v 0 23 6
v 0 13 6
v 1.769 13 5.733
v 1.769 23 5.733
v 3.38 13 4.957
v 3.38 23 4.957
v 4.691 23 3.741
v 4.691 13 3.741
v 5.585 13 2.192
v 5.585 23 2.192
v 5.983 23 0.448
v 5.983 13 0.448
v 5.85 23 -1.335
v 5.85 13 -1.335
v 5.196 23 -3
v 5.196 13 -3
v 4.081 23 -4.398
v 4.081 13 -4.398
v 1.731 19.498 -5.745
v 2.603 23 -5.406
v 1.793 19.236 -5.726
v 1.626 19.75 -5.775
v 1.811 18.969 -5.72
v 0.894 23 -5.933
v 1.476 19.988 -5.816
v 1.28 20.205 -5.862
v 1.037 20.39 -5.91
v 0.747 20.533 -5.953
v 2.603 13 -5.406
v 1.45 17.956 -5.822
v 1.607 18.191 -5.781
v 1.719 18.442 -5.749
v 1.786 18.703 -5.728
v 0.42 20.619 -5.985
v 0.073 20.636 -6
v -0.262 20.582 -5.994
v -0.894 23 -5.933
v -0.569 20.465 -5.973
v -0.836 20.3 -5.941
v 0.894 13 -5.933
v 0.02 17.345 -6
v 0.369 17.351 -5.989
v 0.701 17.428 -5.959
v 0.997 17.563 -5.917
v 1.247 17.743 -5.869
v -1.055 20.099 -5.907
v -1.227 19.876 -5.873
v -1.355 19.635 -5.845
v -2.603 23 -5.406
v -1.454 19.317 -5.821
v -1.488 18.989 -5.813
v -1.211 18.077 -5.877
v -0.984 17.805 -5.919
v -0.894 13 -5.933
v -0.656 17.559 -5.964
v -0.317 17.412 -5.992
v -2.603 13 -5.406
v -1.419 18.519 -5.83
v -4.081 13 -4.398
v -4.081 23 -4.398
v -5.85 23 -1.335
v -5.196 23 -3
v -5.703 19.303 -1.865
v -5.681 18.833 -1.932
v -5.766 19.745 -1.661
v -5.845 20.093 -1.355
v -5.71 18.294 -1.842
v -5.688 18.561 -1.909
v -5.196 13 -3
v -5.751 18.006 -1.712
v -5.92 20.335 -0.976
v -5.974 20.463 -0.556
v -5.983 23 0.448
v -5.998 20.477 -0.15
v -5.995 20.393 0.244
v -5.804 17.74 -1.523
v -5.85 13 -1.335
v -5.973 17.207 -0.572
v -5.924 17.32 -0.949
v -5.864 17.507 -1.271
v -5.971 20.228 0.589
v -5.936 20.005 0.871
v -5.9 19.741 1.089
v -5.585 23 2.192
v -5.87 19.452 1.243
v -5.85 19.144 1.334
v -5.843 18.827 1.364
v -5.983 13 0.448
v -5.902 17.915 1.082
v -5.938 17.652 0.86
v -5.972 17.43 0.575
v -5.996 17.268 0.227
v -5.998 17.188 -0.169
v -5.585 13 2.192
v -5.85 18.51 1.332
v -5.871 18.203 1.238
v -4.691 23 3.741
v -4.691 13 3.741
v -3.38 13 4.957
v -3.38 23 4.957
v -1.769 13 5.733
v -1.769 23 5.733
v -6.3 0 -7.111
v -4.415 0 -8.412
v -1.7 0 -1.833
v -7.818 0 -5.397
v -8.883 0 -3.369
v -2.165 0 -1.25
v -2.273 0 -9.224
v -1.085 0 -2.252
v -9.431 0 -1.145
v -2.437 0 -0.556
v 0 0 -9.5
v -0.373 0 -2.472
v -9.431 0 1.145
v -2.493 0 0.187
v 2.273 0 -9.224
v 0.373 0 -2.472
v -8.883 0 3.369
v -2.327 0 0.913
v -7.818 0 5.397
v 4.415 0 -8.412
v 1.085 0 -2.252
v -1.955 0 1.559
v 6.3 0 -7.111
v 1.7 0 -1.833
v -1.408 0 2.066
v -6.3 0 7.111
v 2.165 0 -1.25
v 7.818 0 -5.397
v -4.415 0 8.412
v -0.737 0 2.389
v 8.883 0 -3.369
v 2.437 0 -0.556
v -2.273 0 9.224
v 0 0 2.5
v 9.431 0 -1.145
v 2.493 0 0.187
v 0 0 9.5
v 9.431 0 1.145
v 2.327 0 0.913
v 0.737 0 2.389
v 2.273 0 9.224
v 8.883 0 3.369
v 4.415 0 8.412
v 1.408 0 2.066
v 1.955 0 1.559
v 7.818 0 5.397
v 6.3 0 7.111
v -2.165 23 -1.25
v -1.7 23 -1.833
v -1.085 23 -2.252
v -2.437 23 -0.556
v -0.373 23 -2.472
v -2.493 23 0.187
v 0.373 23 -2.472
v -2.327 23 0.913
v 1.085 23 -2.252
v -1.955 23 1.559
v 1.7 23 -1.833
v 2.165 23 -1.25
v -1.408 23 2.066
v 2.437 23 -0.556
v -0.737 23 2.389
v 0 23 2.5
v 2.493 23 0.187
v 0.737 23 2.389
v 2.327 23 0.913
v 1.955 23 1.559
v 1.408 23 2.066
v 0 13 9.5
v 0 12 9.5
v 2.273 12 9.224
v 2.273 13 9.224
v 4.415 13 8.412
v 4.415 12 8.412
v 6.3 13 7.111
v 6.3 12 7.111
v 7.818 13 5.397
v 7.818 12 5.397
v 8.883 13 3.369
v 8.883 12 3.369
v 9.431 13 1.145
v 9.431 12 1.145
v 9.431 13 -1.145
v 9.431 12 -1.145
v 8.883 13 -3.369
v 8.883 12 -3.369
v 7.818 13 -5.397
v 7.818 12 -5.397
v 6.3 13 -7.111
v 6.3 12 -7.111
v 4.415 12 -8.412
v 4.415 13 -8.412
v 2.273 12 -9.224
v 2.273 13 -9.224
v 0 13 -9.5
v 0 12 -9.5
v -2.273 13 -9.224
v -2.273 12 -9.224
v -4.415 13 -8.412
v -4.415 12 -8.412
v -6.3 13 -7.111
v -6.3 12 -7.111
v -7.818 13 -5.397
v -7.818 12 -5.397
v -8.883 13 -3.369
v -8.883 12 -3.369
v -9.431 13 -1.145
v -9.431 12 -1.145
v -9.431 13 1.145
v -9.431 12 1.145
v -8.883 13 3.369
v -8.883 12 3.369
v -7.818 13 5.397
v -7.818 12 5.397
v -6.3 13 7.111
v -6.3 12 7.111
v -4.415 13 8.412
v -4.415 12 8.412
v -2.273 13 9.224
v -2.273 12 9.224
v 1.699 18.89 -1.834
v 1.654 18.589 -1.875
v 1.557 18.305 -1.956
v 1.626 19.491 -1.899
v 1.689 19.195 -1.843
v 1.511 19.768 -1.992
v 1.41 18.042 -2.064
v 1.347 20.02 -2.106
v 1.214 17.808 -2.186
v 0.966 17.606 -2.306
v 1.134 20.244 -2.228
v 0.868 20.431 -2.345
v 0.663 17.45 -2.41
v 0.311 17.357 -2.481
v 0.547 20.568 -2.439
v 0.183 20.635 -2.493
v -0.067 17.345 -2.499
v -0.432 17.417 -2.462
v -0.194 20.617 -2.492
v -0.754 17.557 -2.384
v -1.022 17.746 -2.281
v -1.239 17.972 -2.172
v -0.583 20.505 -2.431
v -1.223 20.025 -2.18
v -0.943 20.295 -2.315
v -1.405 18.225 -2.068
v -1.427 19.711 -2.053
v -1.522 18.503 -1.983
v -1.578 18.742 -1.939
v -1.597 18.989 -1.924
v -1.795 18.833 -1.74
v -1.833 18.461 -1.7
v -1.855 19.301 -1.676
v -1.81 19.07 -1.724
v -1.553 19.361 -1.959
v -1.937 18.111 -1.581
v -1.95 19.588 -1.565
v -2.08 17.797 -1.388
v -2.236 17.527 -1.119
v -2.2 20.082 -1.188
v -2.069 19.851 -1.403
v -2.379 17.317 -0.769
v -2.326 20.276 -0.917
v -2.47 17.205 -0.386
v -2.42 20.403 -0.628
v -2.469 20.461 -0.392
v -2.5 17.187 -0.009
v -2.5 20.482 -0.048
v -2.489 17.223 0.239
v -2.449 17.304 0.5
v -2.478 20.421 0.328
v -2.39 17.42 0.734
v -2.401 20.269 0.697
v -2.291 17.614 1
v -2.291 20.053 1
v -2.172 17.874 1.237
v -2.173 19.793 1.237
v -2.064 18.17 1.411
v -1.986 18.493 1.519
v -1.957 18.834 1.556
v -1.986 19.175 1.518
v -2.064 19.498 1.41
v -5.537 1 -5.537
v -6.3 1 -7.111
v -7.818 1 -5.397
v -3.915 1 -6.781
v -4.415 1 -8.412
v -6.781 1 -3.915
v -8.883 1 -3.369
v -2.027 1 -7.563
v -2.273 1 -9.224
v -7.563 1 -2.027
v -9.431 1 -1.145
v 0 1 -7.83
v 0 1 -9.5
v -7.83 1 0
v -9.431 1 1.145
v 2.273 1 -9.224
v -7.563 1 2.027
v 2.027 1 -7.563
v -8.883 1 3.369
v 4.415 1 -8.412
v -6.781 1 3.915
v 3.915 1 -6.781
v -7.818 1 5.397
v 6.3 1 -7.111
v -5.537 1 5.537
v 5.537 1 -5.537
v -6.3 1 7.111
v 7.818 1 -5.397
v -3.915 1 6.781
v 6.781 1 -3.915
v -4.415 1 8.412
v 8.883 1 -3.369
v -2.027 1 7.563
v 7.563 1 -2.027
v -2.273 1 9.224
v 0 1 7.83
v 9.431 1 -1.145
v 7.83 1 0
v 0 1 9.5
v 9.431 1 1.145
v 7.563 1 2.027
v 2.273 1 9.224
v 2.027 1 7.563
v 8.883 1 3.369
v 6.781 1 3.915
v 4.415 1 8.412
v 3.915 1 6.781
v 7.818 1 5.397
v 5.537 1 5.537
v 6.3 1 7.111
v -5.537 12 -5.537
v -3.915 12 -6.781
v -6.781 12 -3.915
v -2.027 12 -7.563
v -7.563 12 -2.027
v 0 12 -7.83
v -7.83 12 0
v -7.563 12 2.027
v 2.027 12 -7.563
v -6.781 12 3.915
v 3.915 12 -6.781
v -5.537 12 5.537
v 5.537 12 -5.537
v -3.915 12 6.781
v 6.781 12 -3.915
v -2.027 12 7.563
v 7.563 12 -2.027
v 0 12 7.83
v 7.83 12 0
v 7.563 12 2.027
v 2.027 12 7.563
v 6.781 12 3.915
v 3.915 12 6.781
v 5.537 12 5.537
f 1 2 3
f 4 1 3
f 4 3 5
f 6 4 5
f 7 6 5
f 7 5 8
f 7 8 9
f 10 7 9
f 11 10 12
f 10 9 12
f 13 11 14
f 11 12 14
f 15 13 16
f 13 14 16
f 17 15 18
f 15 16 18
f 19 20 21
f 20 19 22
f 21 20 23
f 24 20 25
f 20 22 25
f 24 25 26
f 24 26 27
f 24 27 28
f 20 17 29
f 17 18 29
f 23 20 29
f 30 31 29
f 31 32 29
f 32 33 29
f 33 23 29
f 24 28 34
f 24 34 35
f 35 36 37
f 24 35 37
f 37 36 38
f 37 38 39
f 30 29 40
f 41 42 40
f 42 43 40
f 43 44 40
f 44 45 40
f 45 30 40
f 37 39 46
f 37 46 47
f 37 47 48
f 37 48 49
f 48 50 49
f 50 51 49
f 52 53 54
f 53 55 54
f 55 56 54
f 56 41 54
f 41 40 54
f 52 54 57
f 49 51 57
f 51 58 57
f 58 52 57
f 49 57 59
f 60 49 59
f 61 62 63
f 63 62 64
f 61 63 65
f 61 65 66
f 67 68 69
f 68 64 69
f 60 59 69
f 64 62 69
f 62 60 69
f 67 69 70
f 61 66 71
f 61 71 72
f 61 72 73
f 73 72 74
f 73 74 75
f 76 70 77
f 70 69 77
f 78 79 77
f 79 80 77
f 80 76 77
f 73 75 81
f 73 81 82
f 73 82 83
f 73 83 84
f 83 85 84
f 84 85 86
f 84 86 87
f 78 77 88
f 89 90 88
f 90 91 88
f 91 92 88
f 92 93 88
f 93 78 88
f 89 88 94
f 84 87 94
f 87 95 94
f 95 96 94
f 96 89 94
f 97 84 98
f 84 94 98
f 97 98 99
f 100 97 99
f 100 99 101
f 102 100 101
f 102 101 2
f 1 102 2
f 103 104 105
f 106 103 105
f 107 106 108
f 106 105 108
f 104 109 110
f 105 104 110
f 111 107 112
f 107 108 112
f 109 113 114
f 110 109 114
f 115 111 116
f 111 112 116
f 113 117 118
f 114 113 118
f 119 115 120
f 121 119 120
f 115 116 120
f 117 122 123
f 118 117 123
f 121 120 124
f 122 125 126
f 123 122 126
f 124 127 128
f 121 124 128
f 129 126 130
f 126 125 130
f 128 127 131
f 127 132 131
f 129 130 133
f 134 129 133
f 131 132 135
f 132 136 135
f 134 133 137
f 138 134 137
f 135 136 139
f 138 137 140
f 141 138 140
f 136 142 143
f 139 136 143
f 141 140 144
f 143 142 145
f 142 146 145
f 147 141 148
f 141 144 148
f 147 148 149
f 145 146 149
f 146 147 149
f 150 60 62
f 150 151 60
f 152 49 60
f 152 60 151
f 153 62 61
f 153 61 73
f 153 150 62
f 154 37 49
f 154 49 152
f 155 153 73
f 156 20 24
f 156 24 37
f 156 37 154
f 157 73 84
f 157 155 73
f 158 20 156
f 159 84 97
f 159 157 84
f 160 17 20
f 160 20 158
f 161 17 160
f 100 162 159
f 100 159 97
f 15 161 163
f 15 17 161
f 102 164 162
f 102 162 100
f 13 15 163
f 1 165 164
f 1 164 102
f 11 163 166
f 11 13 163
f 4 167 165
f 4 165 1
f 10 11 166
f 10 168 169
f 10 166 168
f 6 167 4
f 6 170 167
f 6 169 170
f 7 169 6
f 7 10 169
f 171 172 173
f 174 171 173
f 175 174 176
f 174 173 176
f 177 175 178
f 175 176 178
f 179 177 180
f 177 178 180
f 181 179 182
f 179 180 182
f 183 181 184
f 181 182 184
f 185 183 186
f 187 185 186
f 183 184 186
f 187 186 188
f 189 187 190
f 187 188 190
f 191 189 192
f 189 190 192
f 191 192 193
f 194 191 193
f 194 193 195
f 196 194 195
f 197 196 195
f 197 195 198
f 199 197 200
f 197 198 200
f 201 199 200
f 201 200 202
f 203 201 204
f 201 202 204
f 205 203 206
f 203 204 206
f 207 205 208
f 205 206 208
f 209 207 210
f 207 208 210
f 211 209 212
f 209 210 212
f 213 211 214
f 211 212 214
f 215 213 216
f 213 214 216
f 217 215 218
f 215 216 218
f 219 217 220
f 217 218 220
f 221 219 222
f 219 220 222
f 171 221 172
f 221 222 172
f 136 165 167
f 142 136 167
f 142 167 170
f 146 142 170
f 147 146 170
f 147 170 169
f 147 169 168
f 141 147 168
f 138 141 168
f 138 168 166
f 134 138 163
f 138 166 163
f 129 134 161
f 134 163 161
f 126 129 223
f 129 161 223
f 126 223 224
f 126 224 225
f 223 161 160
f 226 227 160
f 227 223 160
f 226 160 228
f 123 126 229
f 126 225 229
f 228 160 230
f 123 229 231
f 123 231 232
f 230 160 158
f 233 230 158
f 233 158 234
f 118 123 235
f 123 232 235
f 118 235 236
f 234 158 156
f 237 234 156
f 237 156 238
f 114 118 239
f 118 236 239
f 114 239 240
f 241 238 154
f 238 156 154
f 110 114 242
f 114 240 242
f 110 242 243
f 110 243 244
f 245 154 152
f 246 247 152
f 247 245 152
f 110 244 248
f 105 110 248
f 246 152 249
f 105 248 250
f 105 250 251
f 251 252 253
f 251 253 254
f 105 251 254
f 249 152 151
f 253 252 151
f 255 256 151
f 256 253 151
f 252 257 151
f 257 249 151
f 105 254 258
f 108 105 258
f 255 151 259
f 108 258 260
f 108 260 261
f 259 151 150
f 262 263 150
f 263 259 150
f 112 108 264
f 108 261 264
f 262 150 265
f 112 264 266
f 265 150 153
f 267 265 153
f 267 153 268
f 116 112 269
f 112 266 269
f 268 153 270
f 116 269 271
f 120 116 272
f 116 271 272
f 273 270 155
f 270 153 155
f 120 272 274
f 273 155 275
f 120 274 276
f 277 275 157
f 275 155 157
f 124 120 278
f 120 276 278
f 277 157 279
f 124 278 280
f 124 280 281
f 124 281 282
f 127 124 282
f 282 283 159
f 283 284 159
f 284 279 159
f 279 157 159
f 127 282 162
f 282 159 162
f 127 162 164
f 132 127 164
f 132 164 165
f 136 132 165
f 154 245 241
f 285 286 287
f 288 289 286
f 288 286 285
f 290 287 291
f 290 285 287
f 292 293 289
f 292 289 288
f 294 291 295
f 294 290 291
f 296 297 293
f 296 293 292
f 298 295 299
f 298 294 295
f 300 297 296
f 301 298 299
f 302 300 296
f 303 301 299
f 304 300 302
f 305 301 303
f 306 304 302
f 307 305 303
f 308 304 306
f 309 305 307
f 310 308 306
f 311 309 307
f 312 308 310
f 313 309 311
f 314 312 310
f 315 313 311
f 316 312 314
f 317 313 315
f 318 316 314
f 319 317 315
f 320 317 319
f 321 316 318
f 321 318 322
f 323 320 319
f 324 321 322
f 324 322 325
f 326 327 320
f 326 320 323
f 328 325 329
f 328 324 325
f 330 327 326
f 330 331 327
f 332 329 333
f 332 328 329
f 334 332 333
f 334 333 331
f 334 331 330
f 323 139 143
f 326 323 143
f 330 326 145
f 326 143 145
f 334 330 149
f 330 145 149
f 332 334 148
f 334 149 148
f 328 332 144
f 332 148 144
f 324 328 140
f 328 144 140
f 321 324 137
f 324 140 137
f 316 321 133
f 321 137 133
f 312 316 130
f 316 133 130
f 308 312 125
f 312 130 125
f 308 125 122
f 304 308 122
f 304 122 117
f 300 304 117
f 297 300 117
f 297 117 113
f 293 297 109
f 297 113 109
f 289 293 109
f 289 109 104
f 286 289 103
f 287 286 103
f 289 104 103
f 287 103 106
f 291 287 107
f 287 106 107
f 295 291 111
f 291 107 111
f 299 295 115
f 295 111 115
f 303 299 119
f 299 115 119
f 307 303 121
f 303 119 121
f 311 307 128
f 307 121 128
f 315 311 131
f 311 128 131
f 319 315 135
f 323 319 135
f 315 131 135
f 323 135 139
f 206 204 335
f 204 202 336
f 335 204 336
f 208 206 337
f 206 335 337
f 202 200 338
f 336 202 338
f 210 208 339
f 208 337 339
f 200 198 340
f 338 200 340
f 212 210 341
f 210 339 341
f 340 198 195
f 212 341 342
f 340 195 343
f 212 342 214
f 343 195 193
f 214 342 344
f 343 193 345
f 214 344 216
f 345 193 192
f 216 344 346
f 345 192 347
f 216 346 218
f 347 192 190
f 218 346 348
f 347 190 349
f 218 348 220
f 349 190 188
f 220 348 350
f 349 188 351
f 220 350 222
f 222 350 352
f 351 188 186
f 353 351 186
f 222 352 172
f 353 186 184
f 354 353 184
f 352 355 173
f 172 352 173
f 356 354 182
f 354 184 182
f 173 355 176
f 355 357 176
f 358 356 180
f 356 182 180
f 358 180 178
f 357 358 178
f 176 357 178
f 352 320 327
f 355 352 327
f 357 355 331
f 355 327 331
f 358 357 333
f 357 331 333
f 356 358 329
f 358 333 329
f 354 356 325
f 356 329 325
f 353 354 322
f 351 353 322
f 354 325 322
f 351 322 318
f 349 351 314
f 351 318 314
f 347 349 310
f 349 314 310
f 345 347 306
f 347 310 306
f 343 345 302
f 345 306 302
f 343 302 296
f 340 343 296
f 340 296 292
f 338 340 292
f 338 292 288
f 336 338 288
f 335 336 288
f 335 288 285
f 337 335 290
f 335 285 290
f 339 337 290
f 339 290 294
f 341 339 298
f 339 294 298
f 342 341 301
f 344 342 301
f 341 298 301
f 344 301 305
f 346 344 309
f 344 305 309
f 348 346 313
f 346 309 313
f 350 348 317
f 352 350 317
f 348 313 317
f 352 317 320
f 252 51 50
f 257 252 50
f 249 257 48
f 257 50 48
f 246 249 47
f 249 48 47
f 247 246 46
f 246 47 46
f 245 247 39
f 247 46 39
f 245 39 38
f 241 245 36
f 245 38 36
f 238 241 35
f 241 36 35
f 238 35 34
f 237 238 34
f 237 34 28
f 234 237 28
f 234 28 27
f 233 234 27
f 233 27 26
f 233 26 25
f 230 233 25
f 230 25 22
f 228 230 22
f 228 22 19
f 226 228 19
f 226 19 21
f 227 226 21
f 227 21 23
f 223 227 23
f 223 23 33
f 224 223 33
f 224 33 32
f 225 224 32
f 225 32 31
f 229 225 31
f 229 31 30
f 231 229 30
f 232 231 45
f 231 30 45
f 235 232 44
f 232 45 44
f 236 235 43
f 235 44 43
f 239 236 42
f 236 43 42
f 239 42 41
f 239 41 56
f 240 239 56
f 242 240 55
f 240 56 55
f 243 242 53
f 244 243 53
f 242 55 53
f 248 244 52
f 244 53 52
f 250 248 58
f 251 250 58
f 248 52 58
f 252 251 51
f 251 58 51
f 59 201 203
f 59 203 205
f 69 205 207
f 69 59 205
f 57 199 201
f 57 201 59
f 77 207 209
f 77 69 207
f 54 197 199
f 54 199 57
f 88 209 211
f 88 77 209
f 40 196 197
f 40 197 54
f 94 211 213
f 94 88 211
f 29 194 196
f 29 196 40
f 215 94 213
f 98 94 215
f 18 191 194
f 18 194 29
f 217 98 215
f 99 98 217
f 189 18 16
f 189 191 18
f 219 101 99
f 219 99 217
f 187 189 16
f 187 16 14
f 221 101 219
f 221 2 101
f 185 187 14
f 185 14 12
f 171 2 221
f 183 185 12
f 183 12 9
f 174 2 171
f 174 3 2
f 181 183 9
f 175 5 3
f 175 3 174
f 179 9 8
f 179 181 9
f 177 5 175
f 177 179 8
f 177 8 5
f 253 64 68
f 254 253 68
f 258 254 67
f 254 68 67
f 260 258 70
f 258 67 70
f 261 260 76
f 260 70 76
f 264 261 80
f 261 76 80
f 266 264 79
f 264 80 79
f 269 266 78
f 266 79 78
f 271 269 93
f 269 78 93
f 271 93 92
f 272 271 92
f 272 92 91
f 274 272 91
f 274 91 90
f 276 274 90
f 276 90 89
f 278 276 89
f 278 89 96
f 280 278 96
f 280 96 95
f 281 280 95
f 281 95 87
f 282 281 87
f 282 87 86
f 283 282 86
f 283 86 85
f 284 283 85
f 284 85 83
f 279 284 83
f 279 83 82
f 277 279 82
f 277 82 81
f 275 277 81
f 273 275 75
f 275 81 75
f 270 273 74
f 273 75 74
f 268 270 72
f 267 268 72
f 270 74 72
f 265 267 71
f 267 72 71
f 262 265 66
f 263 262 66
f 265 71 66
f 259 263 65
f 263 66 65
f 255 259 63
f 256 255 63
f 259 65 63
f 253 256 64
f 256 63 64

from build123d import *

# Parameters (mm, degrees)
SKETCH_1_R              = 9.5
EXTRUDE_1_DEPTH         = 1
SKETCH_2_R              = 7.83
EXTRUDE_2_DEPTH         = 11
SKETCH_3_R              = 9.5
EXTRUDE_3_DEPTH         = 1
SKETCH_4_R              = 6
EXTRUDE_4_DEPTH         = 10
SKETCH_5_R              = 2.5
CUT_EXTRUDE_1_DEPTH     = 27.636441204
HOLE_WIZARD_M4_1_REACH  = 28.281
HOLE_WIZARD_M4_1_BORE_R = 1.65
HOLE_WIZARD_M4_2_REACH  = 28.348
HOLE_WIZARD_M4_2_BORE_R = 1.65


with BuildPart() as part:
    # 草图1 → 凸台-拉伸1 (new body)
    with BuildSketch(Plane(origin=(0, 0, 0), x_dir=(1, 0, 0), z_dir=(0, 1, 0))):
        with Locations(Location((0, 0, 0), (0, 0, 270))):
            Circle(SKETCH_1_R)
    extrude(amount=EXTRUDE_1_DEPTH)

    # 草图2 → 凸台-拉伸2 (add)
    with BuildSketch(Plane(origin=(0, 1, 0), x_dir=(1, 0, 0), z_dir=(0, 1, 0))):
        with Locations(Location((0, 0, 0), (0, 0, 270))):
            Circle(SKETCH_2_R)
    extrude(amount=EXTRUDE_2_DEPTH)

    # 草图3 → 凸台-拉伸3 (add)
    with BuildSketch(Plane(origin=(0, 12, 0), x_dir=(1, 0, 0), z_dir=(0, 1, 0))):
        with Locations(Location((0, 0, 0), (0, 0, 270))):
            Circle(SKETCH_3_R)
    extrude(amount=EXTRUDE_3_DEPTH)

    # 草图4 → 凸台-拉伸4 (add)
    with BuildSketch(Plane(origin=(0, 13, 0), x_dir=(1, 0, 0), z_dir=(0, 1, 0))):
        with Locations(Location((0, 0, 0), (0, 0, 270))):
            Circle(SKETCH_4_R)
    extrude(amount=EXTRUDE_4_DEPTH)

    # 草图5 → 切除-拉伸1 (cut, through all)
    with BuildSketch(Plane(origin=(0, 23, 0), x_dir=(1, 0, 0), z_dir=(0, 1, 0))):
        with Locations(Location((0, 0, 0), (0, 0, 270))):
            Circle(SKETCH_5_R)
    extrude(amount=-CUT_EXTRUDE_1_DEPTH, mode=Mode.SUBTRACT)

    # M4 螺纹孔1 bore (on position points) → M4 螺纹孔1 (cut, up to next)
    with BuildSketch(Plane(origin=(-5.992739495, 18.833476166, -0.295081925), x_dir=(0.04918032089, 0, -0.998789915867), z_dir=(-0.998789915867, 0, -0.04918032089)), mode=Mode.PRIVATE) as hole_wizard_m4_1_sk1:
        Circle(HOLE_WIZARD_M4_1_BORE_R)
    hole_wizard_m4_1_tool1 = extrude(hole_wizard_m4_1_sk1.sketch, amount=-HOLE_WIZARD_M4_1_REACH, mode=Mode.PRIVATE) & part.part
    add(hole_wizard_m4_1_tool1.solids().sort_by_distance((-5.992739, 18.833476, -0.295082))[0], mode=Mode.SUBTRACT)

    # M4 螺纹孔2 bore (on position points) → M4 螺纹孔2 (cut, up to next)
    with BuildSketch(Plane(origin=(0.168248466, 18.988782442, -5.997640574), x_dir=(-0.999606762316, 0, -0.028041411034), z_dir=(0.028041411034, 0, -0.999606762316)), mode=Mode.PRIVATE) as hole_wizard_m4_2_sk1:
        Circle(HOLE_WIZARD_M4_2_BORE_R)
    hole_wizard_m4_2_tool1 = extrude(hole_wizard_m4_2_sk1.sketch, amount=-HOLE_WIZARD_M4_2_REACH, mode=Mode.PRIVATE) & part.part
    add(hole_wizard_m4_2_tool1.solids().sort_by_distance((0.168248, 18.988782, -5.997641))[0], mode=Mode.SUBTRACT)


solid = part.part
